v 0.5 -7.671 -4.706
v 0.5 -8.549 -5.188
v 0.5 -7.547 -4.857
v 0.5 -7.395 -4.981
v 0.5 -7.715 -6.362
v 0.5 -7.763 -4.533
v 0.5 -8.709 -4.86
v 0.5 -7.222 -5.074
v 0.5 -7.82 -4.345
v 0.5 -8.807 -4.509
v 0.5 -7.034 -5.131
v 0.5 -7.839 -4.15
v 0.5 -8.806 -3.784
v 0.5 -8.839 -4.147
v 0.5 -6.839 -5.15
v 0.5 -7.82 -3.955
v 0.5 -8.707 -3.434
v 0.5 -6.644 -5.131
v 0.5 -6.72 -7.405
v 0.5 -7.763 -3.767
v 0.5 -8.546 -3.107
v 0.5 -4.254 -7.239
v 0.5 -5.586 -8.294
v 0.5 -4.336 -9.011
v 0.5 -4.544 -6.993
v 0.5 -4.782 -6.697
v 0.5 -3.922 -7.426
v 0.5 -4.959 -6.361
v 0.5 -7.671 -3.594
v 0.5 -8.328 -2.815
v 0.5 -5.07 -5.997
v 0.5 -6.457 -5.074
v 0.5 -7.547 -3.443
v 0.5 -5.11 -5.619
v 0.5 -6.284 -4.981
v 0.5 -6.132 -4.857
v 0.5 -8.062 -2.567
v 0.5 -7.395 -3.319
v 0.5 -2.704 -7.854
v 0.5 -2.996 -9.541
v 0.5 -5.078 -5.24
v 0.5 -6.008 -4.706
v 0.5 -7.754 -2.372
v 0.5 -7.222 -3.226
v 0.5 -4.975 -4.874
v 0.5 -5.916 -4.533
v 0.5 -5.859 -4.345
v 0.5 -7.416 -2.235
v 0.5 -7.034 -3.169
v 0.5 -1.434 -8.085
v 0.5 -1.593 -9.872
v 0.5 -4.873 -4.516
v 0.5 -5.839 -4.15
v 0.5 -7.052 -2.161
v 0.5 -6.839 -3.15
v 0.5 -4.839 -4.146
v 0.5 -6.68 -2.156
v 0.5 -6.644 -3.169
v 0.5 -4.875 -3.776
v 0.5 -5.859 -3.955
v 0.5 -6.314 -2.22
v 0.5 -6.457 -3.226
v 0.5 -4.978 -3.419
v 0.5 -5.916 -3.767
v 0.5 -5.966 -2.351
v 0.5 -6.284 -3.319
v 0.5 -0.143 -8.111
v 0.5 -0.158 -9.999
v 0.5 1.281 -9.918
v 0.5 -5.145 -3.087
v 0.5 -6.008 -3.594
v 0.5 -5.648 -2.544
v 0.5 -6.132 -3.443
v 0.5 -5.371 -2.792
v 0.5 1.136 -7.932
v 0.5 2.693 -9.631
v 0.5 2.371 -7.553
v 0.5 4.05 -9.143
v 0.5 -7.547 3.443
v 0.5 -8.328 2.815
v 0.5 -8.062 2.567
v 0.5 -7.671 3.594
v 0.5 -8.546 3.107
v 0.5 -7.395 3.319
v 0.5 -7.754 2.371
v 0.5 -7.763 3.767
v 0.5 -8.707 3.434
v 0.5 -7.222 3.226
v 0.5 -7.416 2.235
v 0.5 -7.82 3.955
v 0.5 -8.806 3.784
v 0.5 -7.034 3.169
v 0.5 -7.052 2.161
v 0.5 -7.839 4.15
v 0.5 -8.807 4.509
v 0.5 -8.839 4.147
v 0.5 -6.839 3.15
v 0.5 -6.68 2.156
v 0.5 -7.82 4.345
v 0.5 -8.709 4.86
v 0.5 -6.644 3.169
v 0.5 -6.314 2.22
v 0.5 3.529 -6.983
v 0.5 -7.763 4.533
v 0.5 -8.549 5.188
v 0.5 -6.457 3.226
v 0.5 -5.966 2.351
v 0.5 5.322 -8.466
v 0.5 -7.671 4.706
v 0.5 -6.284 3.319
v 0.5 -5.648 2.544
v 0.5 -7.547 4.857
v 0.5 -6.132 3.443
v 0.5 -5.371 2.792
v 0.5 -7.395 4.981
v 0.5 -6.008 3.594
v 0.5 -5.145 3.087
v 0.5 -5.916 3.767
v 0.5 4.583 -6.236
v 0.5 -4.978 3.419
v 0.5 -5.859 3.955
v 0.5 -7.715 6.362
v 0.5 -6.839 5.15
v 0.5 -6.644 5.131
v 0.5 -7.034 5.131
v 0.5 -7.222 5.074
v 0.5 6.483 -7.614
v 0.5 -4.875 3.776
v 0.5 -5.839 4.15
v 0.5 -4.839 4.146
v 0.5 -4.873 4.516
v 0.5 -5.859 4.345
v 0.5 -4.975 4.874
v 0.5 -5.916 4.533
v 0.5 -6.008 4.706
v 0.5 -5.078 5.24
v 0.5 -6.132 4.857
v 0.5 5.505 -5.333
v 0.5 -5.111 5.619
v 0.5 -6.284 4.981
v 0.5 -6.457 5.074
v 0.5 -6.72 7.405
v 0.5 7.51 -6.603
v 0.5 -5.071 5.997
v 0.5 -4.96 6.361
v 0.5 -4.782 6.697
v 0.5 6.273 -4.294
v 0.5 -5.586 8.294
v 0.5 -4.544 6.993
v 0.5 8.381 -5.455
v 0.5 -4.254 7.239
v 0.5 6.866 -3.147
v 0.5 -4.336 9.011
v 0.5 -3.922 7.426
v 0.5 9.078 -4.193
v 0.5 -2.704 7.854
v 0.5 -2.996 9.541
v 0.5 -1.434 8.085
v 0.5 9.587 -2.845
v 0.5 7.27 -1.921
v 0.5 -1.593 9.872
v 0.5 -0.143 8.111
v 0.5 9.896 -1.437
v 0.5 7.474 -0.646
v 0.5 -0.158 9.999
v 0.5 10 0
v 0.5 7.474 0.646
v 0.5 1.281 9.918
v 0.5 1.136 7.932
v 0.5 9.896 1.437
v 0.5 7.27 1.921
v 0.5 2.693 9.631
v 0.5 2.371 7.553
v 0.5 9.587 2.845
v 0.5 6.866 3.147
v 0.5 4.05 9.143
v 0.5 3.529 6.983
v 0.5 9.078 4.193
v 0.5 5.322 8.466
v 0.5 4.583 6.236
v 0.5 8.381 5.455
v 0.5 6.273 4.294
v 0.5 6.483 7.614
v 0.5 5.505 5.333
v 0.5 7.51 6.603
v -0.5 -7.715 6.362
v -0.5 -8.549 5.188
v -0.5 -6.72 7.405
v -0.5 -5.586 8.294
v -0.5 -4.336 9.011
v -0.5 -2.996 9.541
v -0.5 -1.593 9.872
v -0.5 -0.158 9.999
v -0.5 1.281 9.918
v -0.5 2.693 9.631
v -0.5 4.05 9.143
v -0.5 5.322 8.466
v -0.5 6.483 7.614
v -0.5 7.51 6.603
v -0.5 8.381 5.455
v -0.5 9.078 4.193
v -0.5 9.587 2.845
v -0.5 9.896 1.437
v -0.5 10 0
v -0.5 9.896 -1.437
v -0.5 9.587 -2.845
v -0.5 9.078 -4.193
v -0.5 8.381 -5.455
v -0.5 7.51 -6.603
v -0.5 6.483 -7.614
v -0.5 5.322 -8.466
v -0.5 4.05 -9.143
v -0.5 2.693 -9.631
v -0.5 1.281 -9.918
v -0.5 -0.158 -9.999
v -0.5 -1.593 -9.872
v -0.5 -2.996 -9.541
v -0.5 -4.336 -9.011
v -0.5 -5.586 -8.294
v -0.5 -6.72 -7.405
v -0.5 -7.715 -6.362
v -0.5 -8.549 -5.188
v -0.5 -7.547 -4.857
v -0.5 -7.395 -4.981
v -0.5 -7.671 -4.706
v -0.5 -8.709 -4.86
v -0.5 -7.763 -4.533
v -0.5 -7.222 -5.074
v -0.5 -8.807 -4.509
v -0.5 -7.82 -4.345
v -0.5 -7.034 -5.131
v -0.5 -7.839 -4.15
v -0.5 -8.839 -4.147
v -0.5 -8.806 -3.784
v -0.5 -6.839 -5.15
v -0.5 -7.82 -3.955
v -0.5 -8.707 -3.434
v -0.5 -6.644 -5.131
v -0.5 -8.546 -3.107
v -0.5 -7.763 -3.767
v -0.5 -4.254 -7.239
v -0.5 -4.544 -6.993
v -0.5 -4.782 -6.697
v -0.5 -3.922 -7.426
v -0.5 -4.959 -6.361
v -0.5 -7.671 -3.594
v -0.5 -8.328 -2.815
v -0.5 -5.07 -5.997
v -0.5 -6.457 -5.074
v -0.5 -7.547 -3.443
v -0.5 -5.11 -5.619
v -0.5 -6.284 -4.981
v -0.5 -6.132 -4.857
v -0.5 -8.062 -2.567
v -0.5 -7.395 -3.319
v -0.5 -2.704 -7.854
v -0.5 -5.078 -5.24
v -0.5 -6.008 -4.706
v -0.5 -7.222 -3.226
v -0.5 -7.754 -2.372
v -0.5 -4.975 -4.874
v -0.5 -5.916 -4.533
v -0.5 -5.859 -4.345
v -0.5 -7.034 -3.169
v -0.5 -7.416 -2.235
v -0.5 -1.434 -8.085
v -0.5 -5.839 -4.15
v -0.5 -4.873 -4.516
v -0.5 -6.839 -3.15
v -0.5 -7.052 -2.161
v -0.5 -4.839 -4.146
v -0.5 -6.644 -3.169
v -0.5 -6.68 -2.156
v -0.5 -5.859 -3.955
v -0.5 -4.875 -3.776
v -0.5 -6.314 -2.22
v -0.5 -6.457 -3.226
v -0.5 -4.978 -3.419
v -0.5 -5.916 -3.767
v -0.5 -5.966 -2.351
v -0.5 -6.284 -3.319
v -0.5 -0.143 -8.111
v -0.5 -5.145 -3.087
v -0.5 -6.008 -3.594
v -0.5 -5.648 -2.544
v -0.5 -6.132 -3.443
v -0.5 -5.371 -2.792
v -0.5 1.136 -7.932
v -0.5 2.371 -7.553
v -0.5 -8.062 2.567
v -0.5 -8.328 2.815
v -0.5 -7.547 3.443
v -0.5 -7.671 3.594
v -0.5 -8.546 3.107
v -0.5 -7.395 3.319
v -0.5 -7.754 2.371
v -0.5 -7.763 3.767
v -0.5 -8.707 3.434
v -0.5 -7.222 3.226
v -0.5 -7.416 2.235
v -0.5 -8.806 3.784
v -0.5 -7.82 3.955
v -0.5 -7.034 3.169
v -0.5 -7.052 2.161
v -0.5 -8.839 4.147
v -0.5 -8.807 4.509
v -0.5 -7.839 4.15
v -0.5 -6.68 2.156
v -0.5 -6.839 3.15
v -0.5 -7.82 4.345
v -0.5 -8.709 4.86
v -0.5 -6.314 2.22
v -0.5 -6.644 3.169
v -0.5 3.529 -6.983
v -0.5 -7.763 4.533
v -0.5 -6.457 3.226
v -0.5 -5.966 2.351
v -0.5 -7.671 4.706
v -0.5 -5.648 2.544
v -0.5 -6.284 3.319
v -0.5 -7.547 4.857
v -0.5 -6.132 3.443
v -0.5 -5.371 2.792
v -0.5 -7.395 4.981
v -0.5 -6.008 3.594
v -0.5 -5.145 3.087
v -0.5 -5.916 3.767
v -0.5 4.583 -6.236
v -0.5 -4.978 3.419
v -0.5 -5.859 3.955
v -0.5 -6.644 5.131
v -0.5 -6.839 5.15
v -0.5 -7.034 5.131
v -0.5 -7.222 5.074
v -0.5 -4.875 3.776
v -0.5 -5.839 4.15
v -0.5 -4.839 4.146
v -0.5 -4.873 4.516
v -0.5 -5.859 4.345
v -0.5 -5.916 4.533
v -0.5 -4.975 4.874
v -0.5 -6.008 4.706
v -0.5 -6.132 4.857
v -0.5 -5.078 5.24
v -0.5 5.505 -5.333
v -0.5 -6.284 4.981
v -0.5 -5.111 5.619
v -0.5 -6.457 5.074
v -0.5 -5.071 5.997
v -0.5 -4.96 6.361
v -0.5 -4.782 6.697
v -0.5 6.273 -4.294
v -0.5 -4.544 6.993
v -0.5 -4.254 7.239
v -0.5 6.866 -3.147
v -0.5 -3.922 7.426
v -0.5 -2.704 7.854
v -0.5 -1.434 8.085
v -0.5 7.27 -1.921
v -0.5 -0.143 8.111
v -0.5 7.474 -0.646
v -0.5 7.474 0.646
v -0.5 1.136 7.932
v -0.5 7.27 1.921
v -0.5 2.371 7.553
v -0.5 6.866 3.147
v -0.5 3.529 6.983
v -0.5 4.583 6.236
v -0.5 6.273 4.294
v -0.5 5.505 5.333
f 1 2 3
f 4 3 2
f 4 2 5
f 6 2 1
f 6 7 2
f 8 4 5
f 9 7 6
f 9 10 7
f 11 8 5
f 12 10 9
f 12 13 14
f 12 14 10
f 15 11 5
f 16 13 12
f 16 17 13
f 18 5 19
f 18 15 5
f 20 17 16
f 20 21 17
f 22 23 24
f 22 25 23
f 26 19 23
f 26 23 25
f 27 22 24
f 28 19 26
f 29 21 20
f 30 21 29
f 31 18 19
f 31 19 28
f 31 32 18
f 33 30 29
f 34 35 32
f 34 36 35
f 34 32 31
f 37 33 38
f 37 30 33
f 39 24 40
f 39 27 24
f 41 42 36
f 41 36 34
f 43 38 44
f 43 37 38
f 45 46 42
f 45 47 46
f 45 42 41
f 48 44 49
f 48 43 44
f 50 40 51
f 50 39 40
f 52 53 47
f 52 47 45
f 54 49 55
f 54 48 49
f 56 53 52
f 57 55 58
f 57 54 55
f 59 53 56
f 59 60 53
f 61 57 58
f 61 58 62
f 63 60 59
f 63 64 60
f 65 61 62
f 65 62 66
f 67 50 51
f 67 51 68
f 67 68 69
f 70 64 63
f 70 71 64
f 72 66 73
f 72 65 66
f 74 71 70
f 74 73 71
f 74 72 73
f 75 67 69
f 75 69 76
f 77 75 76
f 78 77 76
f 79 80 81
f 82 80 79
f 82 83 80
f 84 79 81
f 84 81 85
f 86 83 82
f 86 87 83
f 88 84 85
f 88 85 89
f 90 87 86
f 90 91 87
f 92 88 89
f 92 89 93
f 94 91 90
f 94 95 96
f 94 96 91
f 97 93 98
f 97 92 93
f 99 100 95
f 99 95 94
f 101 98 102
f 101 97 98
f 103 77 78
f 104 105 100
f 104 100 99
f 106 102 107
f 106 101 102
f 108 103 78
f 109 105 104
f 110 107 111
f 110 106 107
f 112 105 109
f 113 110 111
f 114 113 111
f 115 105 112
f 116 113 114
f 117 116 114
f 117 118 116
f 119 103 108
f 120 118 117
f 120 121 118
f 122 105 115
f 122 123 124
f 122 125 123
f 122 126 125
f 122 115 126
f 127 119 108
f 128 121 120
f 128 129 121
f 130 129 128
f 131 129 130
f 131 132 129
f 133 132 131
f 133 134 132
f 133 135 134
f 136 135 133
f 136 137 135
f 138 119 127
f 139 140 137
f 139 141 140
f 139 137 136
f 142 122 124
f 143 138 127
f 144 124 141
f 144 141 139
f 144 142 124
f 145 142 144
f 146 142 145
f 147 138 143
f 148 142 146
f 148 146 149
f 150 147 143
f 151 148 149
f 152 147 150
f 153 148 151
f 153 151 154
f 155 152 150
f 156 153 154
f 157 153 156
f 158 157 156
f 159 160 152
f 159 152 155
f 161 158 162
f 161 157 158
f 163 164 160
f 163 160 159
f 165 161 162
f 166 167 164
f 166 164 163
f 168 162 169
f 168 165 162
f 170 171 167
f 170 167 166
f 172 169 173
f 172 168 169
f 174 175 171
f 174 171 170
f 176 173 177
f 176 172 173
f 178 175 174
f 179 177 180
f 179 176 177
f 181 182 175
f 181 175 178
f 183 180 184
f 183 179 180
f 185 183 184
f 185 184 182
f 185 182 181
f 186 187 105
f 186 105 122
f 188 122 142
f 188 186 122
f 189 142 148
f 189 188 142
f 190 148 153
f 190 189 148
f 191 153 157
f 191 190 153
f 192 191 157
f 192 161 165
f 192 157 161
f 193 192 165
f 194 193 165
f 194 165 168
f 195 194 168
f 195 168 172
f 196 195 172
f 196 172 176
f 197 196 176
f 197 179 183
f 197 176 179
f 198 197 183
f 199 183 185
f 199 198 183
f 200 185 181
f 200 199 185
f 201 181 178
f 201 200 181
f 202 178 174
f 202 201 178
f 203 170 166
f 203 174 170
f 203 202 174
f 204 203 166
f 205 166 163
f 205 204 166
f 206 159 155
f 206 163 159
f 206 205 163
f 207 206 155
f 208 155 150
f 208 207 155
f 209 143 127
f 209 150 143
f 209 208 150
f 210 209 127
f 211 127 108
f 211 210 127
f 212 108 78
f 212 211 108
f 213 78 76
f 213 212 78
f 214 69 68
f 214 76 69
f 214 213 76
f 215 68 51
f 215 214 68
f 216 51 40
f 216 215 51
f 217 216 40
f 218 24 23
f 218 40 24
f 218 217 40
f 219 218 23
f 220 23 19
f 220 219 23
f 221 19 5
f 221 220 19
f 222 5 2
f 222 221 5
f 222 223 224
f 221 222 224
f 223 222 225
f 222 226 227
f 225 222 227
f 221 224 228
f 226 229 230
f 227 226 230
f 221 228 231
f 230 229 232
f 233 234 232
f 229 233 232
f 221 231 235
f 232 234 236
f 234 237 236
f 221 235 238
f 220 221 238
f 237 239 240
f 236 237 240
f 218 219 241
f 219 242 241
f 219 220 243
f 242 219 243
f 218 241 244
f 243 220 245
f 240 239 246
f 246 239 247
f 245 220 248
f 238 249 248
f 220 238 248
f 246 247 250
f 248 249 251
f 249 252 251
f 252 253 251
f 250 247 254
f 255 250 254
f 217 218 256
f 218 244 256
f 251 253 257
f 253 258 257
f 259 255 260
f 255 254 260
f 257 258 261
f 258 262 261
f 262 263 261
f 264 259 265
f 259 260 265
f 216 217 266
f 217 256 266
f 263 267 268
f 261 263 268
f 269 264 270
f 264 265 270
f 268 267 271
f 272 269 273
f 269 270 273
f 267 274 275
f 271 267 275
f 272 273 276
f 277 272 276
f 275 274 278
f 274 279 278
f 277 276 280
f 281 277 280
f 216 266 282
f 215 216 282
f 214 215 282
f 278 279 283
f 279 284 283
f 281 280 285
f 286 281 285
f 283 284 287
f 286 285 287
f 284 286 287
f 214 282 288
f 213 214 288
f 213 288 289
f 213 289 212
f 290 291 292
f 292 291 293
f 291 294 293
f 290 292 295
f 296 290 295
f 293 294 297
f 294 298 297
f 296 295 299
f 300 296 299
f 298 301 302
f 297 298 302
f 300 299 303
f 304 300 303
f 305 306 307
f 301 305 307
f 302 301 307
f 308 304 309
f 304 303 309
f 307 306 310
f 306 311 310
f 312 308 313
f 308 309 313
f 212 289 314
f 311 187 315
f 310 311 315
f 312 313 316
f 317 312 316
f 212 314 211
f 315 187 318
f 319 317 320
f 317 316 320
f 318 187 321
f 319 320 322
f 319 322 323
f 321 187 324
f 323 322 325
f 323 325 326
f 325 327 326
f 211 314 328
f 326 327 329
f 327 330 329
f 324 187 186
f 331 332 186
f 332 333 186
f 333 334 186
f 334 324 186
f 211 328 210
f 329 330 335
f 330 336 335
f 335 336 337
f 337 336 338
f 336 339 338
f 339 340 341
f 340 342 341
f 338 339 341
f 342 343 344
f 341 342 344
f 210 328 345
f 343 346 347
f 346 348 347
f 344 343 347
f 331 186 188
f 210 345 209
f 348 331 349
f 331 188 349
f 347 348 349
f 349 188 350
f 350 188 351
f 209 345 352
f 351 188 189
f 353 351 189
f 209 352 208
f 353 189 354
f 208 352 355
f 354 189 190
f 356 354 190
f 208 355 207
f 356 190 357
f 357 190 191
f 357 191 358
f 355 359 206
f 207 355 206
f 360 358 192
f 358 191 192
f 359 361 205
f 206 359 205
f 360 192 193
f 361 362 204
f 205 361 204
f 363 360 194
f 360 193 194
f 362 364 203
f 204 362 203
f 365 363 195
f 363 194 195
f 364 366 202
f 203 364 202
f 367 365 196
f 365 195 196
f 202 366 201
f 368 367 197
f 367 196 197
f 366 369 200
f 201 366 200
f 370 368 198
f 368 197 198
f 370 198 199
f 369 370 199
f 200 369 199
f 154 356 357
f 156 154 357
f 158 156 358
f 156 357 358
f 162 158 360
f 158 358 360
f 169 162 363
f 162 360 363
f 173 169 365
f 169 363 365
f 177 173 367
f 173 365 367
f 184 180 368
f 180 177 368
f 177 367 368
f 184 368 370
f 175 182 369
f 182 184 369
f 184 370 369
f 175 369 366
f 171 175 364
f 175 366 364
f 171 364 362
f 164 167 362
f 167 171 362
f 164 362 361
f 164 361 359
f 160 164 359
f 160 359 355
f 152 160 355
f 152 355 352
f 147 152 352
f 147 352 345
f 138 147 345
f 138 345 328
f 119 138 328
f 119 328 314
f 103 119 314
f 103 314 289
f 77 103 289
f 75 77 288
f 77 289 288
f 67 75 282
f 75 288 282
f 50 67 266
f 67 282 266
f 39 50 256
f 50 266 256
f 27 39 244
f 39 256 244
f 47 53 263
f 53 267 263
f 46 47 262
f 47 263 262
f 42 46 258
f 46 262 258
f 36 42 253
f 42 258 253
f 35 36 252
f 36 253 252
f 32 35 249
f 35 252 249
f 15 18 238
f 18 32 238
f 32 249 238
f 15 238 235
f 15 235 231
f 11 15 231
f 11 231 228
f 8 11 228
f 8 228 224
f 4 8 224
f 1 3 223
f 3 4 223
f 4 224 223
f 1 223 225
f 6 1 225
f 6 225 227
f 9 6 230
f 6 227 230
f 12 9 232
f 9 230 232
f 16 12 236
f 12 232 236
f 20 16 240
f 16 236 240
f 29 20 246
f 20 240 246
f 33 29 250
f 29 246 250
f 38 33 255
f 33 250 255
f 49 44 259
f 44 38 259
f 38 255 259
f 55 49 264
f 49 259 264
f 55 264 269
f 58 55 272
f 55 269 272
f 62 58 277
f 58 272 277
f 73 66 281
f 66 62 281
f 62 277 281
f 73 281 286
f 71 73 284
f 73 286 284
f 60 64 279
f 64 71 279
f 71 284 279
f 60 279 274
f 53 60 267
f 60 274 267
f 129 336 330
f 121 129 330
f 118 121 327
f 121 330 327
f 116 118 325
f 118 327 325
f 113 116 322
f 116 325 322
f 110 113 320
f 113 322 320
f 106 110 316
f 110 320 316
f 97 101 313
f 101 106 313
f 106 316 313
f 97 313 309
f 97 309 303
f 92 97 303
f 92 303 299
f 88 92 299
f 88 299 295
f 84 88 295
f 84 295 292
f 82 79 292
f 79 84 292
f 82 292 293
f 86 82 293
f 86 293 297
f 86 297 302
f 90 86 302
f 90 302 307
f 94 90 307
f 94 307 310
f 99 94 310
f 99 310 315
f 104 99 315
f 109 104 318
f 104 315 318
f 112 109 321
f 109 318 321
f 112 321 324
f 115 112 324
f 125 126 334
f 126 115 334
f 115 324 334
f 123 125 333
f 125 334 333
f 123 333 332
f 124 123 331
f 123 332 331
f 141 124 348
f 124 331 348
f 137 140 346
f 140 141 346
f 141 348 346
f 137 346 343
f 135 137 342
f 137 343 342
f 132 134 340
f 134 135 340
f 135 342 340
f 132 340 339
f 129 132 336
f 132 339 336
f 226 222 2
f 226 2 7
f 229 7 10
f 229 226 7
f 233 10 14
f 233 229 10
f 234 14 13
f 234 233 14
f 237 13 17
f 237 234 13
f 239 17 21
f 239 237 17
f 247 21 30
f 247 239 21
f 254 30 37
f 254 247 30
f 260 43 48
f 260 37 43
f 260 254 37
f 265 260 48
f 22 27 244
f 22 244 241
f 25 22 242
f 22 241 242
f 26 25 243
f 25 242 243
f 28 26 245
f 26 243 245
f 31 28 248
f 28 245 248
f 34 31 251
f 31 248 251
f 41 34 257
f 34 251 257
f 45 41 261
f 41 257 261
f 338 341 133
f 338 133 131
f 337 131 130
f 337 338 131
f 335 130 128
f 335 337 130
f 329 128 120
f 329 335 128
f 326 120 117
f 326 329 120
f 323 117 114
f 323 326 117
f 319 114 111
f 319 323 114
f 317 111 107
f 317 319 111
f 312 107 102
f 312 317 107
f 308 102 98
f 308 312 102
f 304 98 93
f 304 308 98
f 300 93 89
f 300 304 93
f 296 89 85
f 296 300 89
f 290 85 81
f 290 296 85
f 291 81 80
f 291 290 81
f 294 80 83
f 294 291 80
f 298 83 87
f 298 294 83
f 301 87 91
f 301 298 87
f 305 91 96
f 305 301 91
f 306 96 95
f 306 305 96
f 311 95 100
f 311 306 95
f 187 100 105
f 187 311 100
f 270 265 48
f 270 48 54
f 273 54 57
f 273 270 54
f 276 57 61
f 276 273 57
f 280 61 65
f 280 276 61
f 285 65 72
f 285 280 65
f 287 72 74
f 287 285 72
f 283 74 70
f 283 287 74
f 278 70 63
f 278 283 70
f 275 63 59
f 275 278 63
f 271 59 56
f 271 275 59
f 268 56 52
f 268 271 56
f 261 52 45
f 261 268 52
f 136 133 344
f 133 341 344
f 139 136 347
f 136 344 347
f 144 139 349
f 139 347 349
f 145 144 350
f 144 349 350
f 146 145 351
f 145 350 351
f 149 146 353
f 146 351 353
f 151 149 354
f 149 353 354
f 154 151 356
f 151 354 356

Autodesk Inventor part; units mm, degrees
sketch "Sketch_3" plane through (0, 0, 0) normal (1, 0, 0) x (0, 1, 0)
  arc A0 (-8.5493, -5.1875) -> (-8.5493, 5.1875) centre (0, 0) ccw
  arc A1 (-8.5493, 5.1875) -> (-7.4165, 2.2351) centre (-6.8394, 4.15) ccw
  arc A2 (-7.4165, 2.2351) -> (-4.975, 4.874) centre (-6.8394, 4.15) ccw
  arc A3 (-3.9223, 7.4259) -> (-4.975, 4.874) centre (-3.1107, 5.5979) ccw
  arc A4 (-3.9223, -7.4259) -> (-3.9223, 7.4259) centre (-0.625, 0) ccw
  arc A5 (-4.975, -4.874) -> (-3.9223, -7.4259) centre (-3.1107, -5.5979) ccw
  arc A6 (-4.975, -4.874) -> (-7.4165, -2.2351) centre (-6.8394, -4.15) ccw
  arc A7 (-7.4165, -2.2351) -> (-8.5493, -5.1875) centre (-6.8394, -4.15) ccw
  circle A8 centre (-6.8394, -4.15) radius 1
  circle A9 centre (-6.8394, 4.15) radius 1
extrude "Extrusion1" add sketch "Sketch_3" along normal mid plane 1
ref_plane "rr_XY" through (-0.5, 0, 0) normal (1, 0, 0) x (0, 0, -1)
ref_plane "rr_YZ" through (-0.5, 0, 0) normal (0, 0, -1) x (0, 1, 0)
ref_plane "rr_ZX" through (-0.5, 0, 0) normal (0, 1, 0) x (1, 0, 0)
properties part number "RRING-C-INT-S-19"
